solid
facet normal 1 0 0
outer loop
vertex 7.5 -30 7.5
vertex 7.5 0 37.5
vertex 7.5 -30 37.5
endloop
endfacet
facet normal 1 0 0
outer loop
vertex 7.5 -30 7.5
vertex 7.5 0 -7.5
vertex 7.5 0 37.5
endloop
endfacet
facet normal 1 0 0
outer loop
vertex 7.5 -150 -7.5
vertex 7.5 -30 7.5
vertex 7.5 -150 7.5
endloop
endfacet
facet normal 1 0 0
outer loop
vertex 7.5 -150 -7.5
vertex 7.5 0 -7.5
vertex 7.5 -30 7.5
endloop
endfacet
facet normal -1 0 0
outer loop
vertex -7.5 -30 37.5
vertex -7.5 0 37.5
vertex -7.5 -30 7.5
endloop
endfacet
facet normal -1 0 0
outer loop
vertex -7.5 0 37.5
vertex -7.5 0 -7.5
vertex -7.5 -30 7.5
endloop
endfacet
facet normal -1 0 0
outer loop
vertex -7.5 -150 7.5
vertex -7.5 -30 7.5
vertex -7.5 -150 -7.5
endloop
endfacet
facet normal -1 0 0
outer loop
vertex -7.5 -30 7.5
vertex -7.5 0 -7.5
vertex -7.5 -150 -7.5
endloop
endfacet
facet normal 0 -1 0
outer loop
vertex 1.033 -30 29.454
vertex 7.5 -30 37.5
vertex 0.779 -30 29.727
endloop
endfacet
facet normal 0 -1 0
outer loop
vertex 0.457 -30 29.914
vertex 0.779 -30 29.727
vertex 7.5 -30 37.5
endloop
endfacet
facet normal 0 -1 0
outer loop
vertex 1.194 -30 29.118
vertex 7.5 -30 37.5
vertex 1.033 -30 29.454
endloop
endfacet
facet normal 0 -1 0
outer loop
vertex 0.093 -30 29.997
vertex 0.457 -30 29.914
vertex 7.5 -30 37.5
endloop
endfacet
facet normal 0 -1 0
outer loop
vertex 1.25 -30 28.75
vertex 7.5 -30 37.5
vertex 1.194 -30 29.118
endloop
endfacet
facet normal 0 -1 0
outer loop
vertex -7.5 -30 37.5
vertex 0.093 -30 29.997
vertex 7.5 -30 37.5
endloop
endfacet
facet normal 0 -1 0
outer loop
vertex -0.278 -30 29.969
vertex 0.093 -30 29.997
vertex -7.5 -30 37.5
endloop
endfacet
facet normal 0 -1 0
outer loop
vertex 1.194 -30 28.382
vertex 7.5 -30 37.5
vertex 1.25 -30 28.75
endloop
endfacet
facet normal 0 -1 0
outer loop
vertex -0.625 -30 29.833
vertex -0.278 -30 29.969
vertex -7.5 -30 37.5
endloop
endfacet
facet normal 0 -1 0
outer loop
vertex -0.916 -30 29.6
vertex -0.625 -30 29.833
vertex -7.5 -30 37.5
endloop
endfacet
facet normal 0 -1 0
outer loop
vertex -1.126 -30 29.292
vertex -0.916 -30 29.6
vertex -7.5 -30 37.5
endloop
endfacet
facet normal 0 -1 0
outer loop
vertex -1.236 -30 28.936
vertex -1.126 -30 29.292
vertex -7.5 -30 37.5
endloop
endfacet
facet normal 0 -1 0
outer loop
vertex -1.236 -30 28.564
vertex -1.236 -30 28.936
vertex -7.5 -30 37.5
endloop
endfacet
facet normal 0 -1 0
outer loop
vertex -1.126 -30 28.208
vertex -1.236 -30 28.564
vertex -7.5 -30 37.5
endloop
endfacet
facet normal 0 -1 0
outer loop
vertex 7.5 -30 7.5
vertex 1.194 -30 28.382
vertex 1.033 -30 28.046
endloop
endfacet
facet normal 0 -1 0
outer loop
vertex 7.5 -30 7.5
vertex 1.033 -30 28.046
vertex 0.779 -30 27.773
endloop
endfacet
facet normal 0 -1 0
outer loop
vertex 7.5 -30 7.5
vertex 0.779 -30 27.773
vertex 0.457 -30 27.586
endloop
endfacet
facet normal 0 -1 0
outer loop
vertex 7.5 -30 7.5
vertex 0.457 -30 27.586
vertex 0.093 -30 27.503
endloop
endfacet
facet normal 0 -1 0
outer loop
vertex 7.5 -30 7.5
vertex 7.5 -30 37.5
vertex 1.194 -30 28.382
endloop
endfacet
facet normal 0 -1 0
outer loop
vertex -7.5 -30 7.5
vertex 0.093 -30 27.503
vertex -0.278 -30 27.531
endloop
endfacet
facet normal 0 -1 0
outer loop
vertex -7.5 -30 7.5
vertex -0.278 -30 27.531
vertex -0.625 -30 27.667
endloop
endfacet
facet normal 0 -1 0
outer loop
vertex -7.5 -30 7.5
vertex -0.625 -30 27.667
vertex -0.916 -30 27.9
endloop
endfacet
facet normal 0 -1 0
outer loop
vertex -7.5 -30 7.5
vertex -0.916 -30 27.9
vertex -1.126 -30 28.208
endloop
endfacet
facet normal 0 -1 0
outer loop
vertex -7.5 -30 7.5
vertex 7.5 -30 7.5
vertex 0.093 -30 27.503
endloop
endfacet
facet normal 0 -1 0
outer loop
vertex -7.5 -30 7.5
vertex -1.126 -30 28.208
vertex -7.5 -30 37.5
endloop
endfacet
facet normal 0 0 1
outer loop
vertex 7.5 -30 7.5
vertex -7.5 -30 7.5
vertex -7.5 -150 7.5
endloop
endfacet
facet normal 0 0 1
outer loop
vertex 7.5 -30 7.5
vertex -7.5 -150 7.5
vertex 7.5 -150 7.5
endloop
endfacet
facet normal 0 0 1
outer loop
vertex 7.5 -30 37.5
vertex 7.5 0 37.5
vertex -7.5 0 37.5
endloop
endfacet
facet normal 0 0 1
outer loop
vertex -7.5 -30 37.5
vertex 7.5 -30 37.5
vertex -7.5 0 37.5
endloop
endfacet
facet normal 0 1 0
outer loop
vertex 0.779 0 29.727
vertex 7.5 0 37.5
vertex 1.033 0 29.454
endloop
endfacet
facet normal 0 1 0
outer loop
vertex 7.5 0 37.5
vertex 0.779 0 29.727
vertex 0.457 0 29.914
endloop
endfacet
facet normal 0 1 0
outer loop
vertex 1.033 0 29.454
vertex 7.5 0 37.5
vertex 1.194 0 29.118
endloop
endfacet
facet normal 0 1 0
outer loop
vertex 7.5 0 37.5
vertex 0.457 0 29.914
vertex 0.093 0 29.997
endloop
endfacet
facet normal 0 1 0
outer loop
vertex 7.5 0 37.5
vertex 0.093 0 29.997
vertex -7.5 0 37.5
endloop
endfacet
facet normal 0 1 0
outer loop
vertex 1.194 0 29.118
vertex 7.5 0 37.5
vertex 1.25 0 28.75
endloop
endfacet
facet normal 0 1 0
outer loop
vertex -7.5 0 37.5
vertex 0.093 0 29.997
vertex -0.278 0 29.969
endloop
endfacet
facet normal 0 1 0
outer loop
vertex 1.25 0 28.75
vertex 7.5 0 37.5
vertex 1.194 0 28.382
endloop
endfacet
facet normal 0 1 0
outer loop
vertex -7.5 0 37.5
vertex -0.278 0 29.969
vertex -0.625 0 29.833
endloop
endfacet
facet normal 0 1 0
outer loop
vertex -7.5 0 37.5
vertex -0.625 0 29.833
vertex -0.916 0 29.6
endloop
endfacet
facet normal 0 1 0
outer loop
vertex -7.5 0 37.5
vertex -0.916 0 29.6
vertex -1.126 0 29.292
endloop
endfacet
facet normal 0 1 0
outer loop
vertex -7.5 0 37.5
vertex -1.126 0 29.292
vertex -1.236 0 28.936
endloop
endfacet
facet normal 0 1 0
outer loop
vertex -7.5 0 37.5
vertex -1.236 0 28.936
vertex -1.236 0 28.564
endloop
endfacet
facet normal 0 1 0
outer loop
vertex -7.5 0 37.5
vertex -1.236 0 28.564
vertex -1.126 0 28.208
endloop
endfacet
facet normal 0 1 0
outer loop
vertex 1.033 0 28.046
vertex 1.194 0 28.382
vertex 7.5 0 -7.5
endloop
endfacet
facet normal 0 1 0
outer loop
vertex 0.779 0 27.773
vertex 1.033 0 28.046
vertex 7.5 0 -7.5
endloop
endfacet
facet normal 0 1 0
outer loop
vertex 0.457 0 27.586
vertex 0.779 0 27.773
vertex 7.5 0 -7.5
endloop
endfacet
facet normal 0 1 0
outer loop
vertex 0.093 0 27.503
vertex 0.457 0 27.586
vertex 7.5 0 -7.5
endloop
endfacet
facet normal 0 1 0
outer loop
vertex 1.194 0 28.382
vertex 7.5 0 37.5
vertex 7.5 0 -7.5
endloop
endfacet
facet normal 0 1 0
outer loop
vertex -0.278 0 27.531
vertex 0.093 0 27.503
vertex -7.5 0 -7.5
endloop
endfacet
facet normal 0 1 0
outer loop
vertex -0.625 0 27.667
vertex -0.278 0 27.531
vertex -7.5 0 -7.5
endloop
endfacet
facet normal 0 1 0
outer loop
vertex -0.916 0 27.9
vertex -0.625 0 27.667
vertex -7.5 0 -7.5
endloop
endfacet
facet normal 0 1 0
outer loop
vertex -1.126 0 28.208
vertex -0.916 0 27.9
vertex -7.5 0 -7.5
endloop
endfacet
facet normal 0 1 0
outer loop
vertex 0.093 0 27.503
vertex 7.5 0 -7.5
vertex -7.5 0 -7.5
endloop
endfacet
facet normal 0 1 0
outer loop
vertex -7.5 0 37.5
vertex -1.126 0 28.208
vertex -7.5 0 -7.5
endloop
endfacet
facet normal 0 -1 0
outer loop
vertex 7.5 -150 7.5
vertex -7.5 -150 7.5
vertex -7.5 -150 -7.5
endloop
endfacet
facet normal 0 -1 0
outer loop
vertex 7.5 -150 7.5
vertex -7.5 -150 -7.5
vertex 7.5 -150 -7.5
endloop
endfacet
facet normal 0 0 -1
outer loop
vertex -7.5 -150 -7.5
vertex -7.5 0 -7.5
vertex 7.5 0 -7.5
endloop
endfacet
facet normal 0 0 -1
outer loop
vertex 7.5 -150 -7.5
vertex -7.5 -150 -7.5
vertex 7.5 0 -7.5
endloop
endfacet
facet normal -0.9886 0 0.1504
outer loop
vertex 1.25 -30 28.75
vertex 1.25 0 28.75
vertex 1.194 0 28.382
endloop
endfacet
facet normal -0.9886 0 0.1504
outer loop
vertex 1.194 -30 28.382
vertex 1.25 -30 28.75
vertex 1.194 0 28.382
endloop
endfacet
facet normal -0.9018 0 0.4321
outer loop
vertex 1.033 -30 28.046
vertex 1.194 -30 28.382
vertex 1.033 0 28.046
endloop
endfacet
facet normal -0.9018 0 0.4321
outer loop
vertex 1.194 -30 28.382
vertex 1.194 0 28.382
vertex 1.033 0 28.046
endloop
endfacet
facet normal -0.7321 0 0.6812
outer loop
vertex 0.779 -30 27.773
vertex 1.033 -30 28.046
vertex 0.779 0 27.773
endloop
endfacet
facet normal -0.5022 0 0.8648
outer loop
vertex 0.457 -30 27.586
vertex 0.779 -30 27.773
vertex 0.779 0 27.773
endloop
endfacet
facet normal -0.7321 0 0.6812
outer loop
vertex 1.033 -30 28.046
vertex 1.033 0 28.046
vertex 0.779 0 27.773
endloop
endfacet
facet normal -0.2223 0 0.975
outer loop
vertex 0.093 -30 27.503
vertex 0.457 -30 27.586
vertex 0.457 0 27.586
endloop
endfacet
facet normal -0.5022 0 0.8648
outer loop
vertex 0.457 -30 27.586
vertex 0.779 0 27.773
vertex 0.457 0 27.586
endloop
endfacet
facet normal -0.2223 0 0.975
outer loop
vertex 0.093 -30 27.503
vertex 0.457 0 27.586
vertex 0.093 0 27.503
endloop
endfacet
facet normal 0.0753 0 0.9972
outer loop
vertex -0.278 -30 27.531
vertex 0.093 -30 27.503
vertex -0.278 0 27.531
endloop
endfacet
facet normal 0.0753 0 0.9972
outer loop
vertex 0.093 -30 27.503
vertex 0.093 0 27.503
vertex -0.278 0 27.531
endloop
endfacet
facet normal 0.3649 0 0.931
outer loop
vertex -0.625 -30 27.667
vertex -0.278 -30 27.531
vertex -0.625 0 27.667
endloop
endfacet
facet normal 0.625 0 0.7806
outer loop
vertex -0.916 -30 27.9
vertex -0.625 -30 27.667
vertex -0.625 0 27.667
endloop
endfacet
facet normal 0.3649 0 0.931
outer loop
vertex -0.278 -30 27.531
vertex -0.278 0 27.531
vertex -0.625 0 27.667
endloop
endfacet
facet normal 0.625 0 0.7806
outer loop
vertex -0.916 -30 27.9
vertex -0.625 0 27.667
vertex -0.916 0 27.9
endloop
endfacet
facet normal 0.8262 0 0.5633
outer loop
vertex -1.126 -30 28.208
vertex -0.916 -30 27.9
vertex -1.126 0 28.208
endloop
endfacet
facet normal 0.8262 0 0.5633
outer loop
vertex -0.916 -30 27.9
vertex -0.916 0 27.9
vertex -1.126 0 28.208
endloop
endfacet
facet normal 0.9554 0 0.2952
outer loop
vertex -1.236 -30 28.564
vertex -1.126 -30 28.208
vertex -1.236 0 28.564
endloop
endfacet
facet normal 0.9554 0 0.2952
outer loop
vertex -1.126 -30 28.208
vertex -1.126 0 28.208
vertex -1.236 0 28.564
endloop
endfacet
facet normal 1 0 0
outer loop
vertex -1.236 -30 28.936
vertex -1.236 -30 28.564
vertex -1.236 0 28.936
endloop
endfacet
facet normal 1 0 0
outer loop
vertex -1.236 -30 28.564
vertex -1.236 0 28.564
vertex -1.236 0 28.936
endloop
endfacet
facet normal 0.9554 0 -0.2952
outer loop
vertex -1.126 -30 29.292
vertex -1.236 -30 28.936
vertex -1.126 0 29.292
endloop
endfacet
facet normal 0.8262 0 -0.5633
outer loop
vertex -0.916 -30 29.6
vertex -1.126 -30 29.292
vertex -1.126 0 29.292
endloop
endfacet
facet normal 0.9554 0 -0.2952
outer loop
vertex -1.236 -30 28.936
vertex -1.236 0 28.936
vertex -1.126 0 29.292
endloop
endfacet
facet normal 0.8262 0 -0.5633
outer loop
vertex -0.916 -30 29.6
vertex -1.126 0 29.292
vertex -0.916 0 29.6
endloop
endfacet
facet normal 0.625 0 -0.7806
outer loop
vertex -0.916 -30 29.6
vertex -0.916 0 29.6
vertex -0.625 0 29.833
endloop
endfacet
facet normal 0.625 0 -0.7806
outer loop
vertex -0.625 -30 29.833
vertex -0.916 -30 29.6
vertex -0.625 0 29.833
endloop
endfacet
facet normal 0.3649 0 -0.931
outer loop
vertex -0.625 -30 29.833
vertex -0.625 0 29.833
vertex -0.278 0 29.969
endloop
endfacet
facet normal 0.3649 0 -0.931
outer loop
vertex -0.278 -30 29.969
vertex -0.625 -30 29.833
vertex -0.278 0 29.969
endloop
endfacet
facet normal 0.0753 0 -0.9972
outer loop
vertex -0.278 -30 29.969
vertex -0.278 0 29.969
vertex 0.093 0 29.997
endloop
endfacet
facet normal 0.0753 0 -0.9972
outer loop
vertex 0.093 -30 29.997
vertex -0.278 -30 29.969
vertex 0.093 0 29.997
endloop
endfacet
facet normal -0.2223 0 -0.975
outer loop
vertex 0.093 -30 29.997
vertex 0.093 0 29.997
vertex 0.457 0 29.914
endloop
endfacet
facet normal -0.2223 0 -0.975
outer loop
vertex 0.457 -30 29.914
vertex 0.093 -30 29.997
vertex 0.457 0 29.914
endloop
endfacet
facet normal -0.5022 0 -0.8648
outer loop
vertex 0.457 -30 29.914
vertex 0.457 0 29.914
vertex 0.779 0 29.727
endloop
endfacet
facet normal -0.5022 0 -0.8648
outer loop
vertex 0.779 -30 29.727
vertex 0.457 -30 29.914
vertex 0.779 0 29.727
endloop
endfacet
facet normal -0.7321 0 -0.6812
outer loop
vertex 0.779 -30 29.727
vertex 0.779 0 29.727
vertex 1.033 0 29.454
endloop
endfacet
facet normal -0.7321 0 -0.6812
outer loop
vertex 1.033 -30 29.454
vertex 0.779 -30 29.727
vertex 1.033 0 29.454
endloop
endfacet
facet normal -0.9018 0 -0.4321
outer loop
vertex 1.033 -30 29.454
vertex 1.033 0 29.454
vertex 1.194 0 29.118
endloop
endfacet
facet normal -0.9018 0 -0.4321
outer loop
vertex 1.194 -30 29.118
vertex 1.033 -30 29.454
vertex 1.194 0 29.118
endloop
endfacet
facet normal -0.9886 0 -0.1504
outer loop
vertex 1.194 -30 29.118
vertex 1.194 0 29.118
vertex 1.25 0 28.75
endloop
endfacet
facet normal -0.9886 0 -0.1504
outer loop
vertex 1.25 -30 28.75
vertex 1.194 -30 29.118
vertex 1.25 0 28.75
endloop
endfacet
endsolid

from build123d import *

# Parameters (mm, degrees)
SKETCH_W     = 15
SKETCH_H     = 15
PAD_DEPTH    = 150
SKETCH001_W  = 15
SKETCH001_H  = 30
PAD001_DEPTH = 30
SKETCH002_R  = 1.25
POCKET_DEPTH = 150.001


with BuildPart() as part:
    # Sketch → Pad (new body)
    with BuildSketch(Plane.XZ):
        Rectangle(SKETCH_W, SKETCH_H)
    extrude(amount=PAD_DEPTH)

    # Sketch001 (on Face3 of Pad) → Pad001 (join)
    with BuildSketch(Plane(origin=(0, 0, 7.5), x_dir=(-1, 0, 0), z_dir=(0, 0, 1))):
        with Locations((0, 15)):
            Rectangle(SKETCH001_W, SKETCH001_H)
    extrude(amount=PAD001_DEPTH)

    # Sketch002 → Pocket (cut, through all)
    with BuildSketch(Plane(origin=(0, 0, 0), x_dir=(1, 0, 0), z_dir=(0, 1, 0))):
        with Locations((0, -28.75)):
            Circle(SKETCH002_R)
    extrude(amount=-POCKET_DEPTH, mode=Mode.SUBTRACT)


solid = part.part
